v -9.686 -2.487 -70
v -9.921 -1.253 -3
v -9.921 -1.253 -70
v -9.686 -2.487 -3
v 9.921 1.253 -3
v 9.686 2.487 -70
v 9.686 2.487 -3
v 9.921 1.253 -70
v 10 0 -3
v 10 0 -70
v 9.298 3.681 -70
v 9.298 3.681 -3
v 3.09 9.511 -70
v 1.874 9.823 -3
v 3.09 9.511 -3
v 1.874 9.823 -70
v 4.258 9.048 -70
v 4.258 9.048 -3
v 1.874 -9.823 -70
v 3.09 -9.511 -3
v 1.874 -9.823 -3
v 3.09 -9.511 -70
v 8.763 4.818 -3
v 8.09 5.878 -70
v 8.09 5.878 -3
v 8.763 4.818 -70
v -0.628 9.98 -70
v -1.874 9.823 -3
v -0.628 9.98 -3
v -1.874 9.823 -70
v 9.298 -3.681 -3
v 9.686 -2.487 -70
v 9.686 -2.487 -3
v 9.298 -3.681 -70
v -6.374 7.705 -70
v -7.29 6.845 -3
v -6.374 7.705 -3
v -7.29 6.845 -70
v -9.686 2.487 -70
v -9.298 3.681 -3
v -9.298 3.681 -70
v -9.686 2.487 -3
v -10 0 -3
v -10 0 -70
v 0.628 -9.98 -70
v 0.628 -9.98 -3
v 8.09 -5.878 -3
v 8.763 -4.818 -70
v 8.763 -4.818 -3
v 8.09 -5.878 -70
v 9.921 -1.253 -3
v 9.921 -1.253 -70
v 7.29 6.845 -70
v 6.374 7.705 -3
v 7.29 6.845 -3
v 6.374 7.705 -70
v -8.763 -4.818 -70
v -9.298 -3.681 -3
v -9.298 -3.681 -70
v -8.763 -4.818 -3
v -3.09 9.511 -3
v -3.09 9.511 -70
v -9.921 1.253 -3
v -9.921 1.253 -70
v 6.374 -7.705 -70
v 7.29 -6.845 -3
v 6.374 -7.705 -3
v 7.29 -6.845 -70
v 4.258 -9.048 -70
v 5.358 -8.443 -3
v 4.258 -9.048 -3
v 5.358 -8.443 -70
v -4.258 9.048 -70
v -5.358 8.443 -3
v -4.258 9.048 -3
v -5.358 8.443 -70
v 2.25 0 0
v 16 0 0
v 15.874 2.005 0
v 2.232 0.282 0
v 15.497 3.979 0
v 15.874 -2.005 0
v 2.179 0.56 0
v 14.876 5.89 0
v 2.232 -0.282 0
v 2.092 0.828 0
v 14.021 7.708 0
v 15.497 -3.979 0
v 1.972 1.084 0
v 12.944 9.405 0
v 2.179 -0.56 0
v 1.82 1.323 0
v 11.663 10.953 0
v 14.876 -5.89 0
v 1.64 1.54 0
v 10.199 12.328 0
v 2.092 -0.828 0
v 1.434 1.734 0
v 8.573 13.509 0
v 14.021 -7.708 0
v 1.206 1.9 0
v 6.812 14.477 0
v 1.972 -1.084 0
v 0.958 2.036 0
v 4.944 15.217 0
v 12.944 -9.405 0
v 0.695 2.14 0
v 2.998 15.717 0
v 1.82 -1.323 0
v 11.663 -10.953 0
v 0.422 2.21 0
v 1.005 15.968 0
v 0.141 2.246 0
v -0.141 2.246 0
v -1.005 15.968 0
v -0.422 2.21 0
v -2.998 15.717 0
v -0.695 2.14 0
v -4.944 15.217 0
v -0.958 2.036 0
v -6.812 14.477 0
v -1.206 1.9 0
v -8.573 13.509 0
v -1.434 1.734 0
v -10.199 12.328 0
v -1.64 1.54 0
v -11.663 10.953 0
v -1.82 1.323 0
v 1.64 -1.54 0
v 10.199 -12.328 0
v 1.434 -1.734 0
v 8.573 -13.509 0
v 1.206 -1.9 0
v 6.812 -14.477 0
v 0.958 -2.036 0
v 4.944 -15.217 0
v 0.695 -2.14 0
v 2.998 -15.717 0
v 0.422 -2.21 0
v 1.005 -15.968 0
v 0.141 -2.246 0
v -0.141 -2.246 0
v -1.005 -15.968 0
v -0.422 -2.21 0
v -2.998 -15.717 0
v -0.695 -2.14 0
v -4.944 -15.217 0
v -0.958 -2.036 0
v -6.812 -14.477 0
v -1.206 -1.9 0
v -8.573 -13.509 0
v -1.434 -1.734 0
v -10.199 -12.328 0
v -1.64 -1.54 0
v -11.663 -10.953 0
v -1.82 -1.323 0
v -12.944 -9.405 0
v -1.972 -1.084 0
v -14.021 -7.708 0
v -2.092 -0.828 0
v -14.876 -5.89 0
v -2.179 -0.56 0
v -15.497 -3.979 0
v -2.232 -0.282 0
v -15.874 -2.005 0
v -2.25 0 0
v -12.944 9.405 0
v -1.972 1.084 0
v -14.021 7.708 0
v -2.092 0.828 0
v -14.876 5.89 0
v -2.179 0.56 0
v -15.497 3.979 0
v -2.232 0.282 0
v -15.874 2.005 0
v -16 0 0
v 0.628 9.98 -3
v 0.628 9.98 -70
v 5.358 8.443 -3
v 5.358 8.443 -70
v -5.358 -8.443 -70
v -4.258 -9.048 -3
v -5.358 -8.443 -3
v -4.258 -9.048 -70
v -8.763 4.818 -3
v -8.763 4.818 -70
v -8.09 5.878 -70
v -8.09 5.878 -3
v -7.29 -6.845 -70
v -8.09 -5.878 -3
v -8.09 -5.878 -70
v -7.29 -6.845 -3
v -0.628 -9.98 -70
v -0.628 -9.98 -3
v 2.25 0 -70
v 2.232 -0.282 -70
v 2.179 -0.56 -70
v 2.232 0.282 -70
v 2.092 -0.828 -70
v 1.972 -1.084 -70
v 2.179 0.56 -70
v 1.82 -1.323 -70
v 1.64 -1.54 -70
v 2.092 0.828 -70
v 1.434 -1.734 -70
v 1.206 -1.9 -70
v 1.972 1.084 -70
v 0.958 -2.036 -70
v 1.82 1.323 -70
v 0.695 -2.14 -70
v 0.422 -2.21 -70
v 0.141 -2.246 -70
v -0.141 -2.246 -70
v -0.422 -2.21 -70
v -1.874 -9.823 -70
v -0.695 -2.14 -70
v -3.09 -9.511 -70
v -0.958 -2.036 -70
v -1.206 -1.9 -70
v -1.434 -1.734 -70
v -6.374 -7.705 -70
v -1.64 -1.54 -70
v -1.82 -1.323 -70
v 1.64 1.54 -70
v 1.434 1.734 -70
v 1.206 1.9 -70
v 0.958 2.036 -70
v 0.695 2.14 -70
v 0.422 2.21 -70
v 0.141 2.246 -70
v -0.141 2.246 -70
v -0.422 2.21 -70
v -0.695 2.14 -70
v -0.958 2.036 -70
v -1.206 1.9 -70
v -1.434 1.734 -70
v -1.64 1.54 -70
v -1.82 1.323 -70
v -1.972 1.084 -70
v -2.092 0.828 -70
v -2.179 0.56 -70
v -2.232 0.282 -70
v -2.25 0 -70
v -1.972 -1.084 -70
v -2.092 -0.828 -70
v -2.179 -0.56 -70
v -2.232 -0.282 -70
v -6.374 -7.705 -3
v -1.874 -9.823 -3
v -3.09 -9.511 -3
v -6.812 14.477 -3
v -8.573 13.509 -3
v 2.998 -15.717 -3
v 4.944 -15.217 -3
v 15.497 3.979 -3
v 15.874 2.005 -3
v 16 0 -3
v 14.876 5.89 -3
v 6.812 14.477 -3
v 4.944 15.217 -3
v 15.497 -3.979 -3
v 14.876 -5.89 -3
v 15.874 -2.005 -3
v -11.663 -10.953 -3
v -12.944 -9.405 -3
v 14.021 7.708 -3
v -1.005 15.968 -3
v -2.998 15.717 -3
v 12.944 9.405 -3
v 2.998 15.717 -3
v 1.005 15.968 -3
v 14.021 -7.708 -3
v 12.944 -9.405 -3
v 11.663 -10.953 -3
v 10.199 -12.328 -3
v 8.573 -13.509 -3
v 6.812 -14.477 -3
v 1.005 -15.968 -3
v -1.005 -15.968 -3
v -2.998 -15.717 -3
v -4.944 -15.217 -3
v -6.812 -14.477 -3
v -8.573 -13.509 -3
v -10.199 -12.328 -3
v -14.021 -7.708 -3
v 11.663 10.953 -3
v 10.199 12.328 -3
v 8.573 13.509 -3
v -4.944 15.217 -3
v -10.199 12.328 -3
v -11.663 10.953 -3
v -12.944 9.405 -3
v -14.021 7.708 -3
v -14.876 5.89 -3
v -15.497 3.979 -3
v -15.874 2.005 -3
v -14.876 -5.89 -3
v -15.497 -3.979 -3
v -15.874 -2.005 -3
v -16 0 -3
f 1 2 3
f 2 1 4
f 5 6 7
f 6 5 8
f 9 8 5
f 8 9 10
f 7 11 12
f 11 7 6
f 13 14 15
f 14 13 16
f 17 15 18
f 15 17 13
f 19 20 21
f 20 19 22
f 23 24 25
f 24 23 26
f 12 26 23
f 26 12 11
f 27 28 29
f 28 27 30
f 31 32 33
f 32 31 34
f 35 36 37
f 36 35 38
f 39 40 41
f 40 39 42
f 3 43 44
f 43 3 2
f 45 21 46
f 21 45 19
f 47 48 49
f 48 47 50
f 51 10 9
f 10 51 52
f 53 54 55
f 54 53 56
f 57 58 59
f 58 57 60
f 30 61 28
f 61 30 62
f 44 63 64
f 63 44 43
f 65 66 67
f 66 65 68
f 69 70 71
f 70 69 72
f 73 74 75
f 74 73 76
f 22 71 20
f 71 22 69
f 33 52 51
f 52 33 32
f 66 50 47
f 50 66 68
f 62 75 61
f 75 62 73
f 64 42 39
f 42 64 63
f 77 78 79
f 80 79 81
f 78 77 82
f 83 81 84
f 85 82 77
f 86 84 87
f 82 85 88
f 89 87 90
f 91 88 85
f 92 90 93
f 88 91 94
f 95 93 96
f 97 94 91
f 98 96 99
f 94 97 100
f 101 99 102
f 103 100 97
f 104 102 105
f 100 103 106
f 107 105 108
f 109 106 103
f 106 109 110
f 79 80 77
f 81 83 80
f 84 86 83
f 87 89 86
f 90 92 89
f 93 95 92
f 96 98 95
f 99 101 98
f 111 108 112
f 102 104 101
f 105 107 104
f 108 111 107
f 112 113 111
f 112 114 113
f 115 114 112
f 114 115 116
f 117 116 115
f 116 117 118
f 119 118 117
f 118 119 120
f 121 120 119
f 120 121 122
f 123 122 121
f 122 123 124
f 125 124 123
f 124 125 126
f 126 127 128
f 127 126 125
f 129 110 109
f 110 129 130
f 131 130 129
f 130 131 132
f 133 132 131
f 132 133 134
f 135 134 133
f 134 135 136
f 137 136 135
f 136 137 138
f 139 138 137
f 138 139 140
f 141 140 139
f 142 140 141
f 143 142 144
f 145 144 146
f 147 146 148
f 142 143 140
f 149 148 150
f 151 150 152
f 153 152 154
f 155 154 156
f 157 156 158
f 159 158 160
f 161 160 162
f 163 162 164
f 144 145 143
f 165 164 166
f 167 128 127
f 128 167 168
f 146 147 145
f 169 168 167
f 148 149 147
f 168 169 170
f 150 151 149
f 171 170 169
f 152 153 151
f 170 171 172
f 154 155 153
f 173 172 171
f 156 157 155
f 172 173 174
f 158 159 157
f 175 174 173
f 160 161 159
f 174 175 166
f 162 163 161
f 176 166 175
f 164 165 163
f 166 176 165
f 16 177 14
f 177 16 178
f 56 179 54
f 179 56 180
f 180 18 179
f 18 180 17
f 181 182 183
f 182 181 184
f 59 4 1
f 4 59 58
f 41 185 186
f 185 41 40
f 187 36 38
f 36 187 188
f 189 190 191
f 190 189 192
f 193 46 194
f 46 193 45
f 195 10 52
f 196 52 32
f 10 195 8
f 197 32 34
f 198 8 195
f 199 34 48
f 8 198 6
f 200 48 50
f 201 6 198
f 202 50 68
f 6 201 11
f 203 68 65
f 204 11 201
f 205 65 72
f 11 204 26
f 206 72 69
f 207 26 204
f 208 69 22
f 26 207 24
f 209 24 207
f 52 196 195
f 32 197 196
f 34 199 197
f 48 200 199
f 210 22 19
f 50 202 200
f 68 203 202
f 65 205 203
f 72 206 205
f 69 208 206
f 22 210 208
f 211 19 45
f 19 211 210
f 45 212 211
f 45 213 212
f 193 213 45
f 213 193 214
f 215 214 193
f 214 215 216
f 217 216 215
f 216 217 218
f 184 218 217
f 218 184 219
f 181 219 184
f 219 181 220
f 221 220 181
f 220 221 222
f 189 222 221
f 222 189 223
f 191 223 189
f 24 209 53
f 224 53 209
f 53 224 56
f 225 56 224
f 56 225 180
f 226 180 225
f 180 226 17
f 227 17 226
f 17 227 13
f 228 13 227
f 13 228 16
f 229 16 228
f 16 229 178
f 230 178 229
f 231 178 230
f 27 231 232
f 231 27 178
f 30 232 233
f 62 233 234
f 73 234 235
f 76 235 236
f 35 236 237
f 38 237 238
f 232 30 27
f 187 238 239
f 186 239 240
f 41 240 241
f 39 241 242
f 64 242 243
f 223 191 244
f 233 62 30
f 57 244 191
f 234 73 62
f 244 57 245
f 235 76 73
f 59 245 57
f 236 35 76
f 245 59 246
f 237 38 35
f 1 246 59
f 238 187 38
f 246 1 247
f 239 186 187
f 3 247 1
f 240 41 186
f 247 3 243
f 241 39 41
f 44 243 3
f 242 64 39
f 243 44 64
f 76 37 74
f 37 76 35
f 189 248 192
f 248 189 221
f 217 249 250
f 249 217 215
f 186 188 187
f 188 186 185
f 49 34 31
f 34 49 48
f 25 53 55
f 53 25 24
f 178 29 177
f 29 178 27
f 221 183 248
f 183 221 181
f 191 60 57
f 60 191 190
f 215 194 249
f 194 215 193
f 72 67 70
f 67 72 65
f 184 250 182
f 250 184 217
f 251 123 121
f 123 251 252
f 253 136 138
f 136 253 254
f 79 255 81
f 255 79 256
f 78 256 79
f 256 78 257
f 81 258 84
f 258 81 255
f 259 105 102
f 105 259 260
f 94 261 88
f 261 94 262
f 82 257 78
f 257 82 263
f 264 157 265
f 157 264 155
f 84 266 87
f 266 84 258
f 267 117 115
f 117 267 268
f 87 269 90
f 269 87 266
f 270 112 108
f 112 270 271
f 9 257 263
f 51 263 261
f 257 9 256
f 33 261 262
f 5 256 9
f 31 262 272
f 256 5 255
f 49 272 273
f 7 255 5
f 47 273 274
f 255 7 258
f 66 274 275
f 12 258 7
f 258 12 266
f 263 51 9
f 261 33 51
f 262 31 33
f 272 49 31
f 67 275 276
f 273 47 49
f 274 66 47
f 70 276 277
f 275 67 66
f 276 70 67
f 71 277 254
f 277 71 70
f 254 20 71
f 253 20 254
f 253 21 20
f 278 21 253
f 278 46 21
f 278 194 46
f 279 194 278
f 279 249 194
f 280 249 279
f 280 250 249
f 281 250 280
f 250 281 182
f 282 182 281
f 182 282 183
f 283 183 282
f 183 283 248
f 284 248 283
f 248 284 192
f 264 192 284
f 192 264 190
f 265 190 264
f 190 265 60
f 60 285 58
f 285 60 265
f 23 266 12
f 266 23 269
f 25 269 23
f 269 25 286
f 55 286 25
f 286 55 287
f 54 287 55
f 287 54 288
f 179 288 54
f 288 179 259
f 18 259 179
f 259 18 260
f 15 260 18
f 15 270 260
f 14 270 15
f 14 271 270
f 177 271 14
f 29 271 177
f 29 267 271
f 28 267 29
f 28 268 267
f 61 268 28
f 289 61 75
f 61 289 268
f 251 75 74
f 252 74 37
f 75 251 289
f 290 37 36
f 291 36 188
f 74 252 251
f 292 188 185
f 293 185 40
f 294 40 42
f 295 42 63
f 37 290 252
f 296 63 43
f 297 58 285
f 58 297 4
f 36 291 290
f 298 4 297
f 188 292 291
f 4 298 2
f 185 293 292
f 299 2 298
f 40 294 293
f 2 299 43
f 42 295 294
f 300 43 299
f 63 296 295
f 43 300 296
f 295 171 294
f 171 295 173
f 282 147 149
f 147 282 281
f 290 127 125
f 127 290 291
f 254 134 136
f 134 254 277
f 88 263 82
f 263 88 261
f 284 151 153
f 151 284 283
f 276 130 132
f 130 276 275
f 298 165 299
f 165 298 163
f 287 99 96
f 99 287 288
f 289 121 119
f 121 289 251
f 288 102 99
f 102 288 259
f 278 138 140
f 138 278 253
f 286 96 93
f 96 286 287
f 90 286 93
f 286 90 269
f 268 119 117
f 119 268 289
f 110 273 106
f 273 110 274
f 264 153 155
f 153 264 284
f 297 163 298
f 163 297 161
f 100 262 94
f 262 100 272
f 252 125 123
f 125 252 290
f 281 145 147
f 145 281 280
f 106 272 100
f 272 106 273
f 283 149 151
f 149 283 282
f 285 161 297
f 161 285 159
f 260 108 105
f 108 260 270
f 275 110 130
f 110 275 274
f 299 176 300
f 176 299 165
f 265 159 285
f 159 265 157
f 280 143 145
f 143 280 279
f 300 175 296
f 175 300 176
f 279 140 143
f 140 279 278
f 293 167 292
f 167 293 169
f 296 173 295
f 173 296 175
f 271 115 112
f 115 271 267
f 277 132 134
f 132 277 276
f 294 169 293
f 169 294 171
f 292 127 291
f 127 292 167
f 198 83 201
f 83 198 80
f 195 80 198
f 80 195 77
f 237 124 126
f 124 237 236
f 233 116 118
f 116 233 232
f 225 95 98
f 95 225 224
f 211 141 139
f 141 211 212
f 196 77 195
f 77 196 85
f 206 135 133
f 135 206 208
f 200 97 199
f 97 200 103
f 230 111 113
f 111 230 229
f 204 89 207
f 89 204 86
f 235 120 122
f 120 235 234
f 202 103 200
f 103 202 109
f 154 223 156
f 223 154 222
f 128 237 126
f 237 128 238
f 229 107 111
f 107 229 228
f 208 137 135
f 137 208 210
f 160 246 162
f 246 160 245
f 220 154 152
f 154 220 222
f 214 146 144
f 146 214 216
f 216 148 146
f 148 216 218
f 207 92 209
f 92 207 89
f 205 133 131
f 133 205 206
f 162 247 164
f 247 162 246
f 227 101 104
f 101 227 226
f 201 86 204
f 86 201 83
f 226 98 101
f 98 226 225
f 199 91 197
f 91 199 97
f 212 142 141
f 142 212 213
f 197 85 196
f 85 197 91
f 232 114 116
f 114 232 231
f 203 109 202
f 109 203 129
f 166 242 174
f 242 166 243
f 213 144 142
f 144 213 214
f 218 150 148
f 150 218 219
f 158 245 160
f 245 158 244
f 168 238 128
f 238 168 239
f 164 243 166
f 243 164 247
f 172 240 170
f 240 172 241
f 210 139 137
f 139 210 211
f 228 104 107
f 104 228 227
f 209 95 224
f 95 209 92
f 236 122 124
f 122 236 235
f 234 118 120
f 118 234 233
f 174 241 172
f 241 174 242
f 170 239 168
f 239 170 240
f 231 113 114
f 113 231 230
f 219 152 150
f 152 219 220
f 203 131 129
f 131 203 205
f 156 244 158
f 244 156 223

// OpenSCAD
$fn = 50;


difference() {
	union() {
		translate(v = [0, 0, -70.0000000000]) {
			cylinder(h = 70, r = 10.0000000000);
		}
		translate(v = [0, 0, -3.0000000000]) {
			cylinder(h = 3, r = 16.0000000000);
		}
	}
	union() {
		#translate(v = [0, 0, -70]) {
			cylinder(h = 70, r = 2.2500000000);
		}
	}
}
